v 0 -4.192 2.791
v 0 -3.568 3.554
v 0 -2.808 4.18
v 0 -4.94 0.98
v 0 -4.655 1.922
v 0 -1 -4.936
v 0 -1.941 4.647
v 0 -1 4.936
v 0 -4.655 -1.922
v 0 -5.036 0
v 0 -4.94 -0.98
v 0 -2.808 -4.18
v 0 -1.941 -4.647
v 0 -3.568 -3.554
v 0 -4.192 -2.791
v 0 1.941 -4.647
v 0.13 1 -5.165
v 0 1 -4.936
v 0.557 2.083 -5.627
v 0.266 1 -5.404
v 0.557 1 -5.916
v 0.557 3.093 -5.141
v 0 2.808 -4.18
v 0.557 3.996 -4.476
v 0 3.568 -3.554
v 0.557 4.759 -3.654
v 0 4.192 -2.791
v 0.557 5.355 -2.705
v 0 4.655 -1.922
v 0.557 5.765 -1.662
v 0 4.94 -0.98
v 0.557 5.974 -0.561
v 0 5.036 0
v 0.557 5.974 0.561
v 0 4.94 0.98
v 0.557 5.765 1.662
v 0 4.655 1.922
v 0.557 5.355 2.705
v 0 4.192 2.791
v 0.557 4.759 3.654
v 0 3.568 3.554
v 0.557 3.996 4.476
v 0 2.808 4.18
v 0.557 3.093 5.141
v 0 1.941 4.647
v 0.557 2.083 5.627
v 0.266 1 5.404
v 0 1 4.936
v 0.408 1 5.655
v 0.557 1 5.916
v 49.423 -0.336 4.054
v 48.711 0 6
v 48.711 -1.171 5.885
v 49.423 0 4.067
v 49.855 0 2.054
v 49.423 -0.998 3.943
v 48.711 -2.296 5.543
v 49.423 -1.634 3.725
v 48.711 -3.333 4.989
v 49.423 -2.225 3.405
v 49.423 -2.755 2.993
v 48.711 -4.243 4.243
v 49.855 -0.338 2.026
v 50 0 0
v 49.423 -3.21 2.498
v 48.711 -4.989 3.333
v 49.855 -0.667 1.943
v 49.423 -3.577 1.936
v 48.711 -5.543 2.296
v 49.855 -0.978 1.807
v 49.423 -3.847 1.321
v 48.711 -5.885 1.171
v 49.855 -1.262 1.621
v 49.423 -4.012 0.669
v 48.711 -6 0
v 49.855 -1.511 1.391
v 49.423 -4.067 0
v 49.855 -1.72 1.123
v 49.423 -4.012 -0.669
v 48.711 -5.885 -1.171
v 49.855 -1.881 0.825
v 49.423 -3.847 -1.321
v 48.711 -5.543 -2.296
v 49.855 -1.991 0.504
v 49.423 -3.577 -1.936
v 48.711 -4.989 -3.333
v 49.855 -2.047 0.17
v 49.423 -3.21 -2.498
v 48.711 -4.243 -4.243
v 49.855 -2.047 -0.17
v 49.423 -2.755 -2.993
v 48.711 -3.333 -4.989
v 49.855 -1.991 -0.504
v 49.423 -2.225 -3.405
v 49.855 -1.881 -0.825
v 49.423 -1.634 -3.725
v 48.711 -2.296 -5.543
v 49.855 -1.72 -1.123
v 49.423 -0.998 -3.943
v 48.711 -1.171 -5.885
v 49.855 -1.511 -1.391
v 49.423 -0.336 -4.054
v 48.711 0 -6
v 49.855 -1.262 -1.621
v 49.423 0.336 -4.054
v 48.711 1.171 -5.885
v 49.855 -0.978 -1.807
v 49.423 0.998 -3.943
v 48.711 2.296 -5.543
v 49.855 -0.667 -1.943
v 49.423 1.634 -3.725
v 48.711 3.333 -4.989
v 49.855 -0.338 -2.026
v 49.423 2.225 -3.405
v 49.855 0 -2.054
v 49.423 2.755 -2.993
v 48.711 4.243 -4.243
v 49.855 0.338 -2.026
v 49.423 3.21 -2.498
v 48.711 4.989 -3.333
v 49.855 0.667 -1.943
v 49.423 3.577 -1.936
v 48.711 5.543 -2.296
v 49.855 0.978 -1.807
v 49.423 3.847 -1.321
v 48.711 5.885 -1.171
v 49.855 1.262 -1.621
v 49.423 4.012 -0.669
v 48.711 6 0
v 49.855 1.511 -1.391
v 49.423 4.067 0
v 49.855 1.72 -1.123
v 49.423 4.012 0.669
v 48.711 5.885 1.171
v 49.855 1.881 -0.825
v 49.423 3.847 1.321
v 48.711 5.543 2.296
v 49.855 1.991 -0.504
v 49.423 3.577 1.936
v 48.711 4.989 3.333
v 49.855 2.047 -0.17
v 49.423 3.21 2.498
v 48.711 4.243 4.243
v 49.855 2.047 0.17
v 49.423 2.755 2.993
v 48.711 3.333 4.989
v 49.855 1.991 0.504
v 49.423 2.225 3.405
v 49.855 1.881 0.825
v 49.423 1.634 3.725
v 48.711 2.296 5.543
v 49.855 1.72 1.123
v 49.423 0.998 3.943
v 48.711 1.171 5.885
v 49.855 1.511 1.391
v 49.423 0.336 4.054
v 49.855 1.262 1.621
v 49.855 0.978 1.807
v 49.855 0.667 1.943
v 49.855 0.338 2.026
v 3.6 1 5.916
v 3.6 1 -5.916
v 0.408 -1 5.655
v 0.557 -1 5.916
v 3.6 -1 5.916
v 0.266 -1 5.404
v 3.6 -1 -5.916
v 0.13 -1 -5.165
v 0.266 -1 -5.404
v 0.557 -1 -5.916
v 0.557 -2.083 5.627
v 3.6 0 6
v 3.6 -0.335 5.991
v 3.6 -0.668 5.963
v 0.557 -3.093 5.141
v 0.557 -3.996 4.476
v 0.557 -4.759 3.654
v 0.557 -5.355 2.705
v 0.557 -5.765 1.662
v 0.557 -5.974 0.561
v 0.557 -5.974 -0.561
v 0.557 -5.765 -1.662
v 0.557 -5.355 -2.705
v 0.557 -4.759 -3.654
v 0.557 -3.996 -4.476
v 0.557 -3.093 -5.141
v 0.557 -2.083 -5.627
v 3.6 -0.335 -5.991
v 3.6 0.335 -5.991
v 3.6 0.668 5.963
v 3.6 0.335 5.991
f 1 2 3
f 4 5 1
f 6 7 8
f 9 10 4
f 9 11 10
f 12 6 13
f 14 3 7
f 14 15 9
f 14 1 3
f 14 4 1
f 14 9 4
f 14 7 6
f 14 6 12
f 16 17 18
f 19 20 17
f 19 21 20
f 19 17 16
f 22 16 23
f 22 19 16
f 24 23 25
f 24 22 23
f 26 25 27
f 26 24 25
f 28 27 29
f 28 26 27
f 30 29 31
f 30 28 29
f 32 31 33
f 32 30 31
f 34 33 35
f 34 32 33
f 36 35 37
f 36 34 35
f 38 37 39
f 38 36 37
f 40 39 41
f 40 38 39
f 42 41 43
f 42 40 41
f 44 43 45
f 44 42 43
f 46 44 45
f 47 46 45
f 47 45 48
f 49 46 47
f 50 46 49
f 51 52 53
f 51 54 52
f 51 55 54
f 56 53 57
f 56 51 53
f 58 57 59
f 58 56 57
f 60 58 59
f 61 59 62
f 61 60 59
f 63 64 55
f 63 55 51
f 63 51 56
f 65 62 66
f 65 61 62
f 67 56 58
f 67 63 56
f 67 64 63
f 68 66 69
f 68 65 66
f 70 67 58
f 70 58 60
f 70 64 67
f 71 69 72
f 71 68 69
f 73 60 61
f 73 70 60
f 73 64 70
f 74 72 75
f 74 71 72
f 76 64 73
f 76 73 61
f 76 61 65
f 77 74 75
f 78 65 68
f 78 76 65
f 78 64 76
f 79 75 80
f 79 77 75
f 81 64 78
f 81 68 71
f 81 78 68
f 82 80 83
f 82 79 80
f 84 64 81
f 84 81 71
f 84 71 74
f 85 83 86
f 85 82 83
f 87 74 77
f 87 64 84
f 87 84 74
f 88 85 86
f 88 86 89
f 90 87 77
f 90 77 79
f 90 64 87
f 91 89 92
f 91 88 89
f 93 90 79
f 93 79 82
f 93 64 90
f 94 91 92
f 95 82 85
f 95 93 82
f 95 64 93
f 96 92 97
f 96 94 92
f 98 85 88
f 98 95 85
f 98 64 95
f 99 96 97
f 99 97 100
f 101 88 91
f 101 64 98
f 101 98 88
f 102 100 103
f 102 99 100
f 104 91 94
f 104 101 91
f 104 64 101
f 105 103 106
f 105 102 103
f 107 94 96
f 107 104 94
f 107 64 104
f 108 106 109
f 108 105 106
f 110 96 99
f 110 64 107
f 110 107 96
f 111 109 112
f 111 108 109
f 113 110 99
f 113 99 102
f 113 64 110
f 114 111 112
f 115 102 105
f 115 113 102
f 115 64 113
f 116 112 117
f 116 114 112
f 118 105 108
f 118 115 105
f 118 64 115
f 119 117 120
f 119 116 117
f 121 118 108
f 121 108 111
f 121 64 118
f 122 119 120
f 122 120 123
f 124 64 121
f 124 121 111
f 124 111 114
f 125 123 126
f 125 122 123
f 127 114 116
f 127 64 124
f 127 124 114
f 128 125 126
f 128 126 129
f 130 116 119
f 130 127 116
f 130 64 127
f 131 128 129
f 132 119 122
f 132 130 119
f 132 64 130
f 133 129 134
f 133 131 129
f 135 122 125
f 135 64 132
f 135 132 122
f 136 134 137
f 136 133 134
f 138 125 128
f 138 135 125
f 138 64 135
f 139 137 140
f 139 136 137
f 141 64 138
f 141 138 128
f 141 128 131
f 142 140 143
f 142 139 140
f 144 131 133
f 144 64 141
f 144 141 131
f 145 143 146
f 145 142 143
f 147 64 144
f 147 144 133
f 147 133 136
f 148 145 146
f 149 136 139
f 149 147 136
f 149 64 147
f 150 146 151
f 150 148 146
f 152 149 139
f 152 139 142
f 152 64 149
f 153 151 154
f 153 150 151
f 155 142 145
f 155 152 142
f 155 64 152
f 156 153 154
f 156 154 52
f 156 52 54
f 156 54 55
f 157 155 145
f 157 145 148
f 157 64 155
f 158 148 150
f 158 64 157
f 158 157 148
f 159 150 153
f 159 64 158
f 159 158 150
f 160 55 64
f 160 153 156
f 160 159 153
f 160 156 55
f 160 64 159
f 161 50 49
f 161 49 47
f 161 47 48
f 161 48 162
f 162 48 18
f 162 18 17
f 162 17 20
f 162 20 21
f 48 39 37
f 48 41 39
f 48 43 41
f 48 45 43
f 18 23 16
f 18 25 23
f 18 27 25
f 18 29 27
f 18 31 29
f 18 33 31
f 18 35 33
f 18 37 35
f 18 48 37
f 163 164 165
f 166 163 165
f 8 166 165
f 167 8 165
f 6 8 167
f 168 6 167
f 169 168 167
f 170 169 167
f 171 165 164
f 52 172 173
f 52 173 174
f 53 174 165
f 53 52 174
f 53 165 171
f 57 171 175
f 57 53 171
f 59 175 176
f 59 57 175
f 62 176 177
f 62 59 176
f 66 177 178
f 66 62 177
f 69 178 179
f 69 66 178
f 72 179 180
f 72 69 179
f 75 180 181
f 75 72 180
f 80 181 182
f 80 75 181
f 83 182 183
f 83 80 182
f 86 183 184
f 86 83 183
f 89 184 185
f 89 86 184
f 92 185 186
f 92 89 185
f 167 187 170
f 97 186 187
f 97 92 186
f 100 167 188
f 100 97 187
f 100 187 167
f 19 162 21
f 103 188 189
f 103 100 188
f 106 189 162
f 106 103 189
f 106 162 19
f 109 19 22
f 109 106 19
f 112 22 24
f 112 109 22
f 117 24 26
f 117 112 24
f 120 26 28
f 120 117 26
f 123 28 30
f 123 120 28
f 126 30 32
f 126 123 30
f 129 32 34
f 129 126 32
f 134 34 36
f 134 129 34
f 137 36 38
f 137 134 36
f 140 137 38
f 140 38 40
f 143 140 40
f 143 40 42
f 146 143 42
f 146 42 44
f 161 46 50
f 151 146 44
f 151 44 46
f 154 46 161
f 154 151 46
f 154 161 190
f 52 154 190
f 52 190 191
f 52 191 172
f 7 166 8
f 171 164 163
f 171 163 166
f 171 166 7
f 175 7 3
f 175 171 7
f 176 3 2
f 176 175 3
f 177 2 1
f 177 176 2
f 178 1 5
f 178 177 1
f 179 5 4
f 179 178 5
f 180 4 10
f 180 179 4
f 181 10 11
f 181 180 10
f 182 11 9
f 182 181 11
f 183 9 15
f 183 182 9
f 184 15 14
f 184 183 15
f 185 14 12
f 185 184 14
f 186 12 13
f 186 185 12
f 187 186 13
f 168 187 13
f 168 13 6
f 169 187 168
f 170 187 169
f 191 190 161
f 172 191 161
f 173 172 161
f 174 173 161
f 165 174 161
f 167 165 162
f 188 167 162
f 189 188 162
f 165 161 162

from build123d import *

# Parameters (mm, degrees)
SKETCH2_W  = 12
SKETCH2_H  = 2
SLOT_DEPTH = 3.6


with BuildPart() as part:
    # BodySke → BaseBody (revolve)
    with BuildSketch(Plane.XY, mode=Mode.PRIVATE) as basebody_sk:
        with BuildLine():
            Line((0.556565659, 6), (48.711457479, 6))
            ThreePointArc((48.711457479, 6), (49.674233358, 3.068401124), (50, 0))
            Line((50, 0), (0, 0))
            Line((0, 0), (0, 5.036))
            Line((0, 5.036), (0.556565659, 6))
        make_face()
    revolve(basebody_sk.sketch.rotate(Axis((-12.7, 0, 0), (1, 0, 0)), 90), axis=Axis((-12.7, 0, 0), (1, 0, 0)))

    # Sketch2 → Slot (cut)
    with BuildSketch(Plane(origin=(0, 0, 0), x_dir=(0, 0, -1), z_dir=(1, 0, 0))):
        Rectangle(SKETCH2_W, SKETCH2_H)
    extrude(amount=SLOT_DEPTH, mode=Mode.SUBTRACT)


solid = part.part
